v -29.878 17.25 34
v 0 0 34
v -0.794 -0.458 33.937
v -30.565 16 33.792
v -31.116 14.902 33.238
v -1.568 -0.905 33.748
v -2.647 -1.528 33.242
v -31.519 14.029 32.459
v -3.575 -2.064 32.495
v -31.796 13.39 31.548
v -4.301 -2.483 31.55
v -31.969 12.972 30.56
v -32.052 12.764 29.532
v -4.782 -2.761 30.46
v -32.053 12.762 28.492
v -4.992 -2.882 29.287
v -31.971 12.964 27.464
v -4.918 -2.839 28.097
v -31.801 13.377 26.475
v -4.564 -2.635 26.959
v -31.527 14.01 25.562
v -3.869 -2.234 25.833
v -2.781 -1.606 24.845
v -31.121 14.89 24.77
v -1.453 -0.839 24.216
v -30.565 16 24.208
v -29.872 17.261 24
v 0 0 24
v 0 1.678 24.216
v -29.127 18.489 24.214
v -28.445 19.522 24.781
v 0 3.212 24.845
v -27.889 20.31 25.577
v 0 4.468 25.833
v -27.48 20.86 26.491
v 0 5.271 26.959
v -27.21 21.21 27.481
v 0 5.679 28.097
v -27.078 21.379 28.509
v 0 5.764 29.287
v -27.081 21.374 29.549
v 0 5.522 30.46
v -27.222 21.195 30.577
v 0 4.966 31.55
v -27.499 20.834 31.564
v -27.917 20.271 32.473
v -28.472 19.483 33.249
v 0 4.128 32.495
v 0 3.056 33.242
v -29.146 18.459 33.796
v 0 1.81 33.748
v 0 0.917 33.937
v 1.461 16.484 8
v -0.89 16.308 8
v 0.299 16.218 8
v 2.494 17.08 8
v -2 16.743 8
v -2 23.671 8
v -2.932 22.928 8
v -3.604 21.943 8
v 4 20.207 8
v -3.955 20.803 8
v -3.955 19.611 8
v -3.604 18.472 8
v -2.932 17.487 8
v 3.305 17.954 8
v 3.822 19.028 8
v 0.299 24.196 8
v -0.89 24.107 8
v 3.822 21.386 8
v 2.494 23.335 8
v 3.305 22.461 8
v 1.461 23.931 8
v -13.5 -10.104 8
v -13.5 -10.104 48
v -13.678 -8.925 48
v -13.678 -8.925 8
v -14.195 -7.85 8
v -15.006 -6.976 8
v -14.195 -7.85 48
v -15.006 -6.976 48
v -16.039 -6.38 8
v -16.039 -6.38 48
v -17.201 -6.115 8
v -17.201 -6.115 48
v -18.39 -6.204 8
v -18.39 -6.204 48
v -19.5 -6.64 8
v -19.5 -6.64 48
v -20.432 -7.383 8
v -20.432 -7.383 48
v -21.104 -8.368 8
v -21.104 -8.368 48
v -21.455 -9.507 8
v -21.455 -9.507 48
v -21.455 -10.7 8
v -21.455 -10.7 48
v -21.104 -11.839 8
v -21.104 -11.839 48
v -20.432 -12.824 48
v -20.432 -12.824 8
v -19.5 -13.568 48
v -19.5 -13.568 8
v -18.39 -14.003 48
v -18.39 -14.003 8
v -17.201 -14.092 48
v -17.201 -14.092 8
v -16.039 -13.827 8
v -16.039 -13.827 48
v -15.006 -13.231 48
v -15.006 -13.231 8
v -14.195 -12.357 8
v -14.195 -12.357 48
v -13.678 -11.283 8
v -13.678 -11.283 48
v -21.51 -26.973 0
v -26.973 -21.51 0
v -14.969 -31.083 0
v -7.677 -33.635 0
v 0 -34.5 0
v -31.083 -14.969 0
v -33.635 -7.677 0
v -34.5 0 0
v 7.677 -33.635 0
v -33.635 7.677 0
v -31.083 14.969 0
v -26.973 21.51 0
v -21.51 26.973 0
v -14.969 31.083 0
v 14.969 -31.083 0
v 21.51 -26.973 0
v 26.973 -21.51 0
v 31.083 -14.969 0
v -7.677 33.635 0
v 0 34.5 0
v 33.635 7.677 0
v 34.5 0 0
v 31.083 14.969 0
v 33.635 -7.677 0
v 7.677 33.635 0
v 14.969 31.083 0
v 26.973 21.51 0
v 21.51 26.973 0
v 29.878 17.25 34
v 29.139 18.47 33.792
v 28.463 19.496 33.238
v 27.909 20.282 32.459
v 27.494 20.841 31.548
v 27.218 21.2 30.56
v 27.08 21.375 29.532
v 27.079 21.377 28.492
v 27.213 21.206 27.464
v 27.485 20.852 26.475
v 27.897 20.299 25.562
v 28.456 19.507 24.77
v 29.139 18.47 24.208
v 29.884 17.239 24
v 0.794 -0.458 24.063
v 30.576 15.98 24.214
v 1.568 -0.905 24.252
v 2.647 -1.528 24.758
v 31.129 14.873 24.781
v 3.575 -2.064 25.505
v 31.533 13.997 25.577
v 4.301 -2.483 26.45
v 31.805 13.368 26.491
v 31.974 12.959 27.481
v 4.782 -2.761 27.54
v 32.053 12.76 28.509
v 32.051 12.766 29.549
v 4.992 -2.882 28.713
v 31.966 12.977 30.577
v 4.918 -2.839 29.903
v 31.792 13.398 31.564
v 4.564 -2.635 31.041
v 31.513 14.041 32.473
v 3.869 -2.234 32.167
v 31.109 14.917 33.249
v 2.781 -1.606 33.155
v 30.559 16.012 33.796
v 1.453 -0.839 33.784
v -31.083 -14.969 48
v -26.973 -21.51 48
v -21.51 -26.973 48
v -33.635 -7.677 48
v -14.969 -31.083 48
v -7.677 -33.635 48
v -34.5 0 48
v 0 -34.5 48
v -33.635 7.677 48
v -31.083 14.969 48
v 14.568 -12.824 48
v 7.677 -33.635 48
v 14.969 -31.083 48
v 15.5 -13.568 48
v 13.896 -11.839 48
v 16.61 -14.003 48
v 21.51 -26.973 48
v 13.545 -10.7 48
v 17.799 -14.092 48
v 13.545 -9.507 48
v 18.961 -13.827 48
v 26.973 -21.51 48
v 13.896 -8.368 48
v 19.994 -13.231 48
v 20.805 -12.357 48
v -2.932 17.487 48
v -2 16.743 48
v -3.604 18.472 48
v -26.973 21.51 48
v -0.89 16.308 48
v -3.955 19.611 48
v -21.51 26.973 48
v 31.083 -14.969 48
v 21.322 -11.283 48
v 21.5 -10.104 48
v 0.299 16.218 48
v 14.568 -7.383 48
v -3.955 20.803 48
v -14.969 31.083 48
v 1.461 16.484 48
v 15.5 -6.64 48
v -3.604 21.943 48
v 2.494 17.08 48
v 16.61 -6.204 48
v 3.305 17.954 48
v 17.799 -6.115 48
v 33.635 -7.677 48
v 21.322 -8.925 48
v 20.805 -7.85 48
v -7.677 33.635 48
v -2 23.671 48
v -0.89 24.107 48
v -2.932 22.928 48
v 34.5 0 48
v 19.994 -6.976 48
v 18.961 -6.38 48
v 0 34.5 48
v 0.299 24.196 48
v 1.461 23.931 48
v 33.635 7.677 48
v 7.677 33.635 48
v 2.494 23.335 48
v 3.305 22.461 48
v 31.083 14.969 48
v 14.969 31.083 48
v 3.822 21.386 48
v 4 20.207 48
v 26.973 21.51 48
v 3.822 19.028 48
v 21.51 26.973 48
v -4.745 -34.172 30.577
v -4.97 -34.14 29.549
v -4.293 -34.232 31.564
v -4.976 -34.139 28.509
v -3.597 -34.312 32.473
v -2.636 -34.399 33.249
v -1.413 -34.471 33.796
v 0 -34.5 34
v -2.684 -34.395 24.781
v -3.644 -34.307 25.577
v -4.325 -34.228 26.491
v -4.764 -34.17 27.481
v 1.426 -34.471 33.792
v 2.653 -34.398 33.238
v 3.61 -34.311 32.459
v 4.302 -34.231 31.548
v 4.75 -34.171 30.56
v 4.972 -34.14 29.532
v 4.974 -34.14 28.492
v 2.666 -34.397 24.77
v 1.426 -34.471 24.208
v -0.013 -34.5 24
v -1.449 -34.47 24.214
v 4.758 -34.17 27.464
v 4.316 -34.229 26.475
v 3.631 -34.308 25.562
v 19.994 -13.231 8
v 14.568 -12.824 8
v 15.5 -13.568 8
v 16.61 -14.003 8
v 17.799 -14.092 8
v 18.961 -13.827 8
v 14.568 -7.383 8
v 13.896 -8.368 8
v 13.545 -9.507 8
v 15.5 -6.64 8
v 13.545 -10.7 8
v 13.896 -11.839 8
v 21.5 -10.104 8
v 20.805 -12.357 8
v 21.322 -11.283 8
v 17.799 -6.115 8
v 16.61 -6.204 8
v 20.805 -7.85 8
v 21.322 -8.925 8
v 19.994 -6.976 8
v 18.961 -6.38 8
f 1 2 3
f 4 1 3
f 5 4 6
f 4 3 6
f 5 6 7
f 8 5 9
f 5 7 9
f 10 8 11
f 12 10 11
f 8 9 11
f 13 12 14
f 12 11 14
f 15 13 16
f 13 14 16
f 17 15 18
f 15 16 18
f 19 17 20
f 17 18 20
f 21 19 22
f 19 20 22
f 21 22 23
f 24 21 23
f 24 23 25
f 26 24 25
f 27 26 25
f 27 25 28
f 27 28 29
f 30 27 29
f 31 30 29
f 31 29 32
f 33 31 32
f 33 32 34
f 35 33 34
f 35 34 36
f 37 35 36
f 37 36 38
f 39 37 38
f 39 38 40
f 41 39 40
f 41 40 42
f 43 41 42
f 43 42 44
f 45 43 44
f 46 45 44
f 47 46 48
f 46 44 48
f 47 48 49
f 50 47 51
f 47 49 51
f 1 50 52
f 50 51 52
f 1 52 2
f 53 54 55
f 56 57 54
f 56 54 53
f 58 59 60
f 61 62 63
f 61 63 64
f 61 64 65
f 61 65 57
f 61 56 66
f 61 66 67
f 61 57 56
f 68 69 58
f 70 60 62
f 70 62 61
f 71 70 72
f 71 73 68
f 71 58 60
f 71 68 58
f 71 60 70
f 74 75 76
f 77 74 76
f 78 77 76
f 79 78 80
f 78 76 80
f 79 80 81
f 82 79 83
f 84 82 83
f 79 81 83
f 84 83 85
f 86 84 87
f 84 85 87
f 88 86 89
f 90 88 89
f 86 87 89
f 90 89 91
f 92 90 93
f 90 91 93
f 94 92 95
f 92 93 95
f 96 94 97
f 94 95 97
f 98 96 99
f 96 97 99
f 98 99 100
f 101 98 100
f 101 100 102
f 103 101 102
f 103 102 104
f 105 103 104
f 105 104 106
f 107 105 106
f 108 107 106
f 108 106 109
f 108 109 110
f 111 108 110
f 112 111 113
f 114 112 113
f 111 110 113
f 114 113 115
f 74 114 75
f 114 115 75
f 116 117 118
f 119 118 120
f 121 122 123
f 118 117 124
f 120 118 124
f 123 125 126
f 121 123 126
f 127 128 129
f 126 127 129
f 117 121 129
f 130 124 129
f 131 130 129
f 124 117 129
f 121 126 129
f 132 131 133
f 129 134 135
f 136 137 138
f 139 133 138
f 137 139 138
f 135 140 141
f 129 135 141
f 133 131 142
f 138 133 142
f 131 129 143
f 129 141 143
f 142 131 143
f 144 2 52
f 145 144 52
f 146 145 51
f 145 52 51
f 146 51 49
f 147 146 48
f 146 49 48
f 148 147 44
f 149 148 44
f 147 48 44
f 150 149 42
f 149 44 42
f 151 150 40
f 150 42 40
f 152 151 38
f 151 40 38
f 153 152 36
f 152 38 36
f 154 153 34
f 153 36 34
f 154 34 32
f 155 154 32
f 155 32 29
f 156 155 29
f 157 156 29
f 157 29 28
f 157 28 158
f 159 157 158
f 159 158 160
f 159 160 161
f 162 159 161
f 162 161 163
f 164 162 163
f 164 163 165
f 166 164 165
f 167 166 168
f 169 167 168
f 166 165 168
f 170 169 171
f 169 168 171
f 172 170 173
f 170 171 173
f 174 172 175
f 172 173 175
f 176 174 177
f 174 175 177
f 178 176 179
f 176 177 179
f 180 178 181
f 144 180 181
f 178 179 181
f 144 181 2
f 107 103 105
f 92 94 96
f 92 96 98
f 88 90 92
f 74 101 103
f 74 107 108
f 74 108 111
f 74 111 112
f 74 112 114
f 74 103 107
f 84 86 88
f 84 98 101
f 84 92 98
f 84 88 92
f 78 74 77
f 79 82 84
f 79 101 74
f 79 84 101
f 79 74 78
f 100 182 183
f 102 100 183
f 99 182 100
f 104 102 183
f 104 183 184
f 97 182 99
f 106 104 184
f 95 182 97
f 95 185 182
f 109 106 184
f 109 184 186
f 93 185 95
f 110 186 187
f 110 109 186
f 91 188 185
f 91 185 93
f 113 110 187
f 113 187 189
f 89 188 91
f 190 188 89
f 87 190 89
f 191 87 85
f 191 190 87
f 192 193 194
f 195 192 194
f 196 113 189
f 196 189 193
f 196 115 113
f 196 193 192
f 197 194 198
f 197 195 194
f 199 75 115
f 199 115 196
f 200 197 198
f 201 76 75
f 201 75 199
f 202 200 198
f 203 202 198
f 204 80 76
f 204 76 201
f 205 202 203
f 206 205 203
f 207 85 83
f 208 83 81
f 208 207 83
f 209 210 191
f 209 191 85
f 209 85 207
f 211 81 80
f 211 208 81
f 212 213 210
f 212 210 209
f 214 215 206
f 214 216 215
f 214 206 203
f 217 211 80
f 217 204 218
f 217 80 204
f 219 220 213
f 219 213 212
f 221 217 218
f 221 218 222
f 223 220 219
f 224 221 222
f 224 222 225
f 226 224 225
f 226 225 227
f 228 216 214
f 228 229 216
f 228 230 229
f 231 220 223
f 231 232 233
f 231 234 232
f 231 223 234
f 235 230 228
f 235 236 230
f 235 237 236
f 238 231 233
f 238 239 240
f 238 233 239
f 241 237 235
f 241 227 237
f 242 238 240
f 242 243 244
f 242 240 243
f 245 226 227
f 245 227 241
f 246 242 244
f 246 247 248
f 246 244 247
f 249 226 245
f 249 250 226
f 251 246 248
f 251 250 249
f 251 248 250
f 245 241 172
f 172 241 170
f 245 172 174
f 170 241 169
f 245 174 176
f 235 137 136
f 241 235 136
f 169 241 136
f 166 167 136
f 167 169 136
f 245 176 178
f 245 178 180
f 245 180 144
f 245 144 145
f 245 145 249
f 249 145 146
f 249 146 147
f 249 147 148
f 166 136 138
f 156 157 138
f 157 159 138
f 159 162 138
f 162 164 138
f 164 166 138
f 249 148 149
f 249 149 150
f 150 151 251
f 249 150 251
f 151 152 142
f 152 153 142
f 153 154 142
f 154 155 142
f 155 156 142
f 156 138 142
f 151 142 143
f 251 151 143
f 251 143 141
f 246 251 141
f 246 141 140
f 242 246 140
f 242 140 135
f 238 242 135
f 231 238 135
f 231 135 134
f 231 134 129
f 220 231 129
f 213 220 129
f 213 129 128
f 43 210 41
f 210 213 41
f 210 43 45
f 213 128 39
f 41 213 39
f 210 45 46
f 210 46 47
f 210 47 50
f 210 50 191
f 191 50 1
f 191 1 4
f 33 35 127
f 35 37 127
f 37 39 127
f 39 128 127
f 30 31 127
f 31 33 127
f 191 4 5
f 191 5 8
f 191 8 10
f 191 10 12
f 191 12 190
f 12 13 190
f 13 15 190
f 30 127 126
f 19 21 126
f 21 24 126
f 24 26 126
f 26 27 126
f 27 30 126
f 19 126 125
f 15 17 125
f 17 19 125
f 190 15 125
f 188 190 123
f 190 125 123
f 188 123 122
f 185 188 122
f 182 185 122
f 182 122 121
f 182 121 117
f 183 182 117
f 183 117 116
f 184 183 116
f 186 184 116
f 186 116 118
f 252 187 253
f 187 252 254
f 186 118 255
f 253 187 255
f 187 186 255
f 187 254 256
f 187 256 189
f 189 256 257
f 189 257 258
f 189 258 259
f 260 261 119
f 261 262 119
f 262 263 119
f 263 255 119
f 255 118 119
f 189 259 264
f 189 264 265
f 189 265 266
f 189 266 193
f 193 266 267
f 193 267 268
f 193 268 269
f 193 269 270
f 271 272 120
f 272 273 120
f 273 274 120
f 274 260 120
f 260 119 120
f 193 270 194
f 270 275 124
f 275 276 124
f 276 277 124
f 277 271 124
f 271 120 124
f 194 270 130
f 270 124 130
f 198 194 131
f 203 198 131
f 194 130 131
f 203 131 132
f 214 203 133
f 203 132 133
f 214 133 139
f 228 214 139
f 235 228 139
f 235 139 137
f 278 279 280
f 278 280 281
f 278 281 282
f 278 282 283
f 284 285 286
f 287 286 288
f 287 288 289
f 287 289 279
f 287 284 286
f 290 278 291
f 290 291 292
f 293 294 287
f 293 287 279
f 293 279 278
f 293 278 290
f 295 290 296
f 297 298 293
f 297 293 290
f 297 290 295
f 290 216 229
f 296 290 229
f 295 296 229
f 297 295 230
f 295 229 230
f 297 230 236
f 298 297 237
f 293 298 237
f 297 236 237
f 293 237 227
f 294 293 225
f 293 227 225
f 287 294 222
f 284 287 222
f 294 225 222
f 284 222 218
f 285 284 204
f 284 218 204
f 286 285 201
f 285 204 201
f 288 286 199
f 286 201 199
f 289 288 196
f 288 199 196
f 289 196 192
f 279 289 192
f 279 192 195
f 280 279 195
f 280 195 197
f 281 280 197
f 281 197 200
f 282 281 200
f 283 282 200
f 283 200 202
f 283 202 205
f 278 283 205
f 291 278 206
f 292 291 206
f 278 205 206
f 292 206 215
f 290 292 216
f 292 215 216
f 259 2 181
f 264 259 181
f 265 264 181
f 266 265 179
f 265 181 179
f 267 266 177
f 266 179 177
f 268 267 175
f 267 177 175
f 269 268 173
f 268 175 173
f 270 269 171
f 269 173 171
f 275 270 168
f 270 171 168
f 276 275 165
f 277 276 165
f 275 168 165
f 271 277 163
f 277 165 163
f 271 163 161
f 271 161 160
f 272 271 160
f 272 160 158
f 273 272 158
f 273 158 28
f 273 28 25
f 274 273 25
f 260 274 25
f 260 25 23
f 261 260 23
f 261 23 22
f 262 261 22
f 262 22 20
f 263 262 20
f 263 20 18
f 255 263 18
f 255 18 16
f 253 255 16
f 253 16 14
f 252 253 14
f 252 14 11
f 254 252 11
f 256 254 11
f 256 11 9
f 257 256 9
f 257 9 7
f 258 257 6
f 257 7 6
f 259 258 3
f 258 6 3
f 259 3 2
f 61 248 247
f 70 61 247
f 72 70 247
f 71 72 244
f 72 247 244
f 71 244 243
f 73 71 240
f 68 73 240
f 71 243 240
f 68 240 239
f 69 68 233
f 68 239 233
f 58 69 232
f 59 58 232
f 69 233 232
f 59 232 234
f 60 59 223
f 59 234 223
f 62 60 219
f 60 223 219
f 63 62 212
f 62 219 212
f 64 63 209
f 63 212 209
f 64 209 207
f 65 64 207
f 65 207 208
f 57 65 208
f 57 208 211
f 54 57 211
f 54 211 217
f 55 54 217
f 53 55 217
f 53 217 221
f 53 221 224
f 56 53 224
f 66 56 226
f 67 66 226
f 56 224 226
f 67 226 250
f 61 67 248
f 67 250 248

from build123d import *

# Parameters (mm, degrees)
SKICA1_R                 = 34.5
P_IDAT_VYSUNUT_M1_DEPTH  = 48
SKICA2_R                 = 4
ODEBRAT_VYSUNUT_M1_DEPTH = 40
SKICA3_R                 = 5
ODEBRAT_VYSUNUT_M2_DEPTH = 69.443407279
KRUHOV_POLE1_COUNT       = 3


with BuildPart() as part:
    # Skica1 → Přidat vysunutím1 (new body)
    with BuildSketch(Plane.XY):
        Circle(SKICA1_R)
    extrude(amount=P_IDAT_VYSUNUT_M1_DEPTH)

    # Skica2 → Odebrat vysunutím1 (cut)
    with BuildSketch(Plane.XY.offset(48)):
        with Locations((0, 20.207259422)):
            Circle(SKICA2_R)
        with Locations((17.5, -10.103629711)):
            Circle(SKICA2_R)
        with Locations((-17.5, -10.103629711)):
            Circle(SKICA2_R)
    extrude(amount=-ODEBRAT_VYSUNUT_M1_DEPTH, mode=Mode.SUBTRACT)

    # Skica3 → Odebrat vysunutím2 (cut, through all)
    with BuildSketch(Plane(origin=(0, 0, 0), x_dir=(1, 0, 0), z_dir=(0, 1, 0))):
        with Locations(Location((0, -29, 0), (0, 0, 270))):
            Circle(SKICA3_R)
    odebrat_vysunut_m2 = extrude(amount=-ODEBRAT_VYSUNUT_M2_DEPTH, mode=Mode.SUBTRACT)

    # Kruhové pole1: Odebrat vysunutím2 ×3 about axis
    kruhov_pole1_axis = Axis((0, 0, 48), (0, 0, -1))
    for i in range(1, KRUHOV_POLE1_COUNT):
        add(odebrat_vysunut_m2.rotate(kruhov_pole1_axis, i * 360 / KRUHOV_POLE1_COUNT), mode=Mode.SUBTRACT)


solid = part.part
